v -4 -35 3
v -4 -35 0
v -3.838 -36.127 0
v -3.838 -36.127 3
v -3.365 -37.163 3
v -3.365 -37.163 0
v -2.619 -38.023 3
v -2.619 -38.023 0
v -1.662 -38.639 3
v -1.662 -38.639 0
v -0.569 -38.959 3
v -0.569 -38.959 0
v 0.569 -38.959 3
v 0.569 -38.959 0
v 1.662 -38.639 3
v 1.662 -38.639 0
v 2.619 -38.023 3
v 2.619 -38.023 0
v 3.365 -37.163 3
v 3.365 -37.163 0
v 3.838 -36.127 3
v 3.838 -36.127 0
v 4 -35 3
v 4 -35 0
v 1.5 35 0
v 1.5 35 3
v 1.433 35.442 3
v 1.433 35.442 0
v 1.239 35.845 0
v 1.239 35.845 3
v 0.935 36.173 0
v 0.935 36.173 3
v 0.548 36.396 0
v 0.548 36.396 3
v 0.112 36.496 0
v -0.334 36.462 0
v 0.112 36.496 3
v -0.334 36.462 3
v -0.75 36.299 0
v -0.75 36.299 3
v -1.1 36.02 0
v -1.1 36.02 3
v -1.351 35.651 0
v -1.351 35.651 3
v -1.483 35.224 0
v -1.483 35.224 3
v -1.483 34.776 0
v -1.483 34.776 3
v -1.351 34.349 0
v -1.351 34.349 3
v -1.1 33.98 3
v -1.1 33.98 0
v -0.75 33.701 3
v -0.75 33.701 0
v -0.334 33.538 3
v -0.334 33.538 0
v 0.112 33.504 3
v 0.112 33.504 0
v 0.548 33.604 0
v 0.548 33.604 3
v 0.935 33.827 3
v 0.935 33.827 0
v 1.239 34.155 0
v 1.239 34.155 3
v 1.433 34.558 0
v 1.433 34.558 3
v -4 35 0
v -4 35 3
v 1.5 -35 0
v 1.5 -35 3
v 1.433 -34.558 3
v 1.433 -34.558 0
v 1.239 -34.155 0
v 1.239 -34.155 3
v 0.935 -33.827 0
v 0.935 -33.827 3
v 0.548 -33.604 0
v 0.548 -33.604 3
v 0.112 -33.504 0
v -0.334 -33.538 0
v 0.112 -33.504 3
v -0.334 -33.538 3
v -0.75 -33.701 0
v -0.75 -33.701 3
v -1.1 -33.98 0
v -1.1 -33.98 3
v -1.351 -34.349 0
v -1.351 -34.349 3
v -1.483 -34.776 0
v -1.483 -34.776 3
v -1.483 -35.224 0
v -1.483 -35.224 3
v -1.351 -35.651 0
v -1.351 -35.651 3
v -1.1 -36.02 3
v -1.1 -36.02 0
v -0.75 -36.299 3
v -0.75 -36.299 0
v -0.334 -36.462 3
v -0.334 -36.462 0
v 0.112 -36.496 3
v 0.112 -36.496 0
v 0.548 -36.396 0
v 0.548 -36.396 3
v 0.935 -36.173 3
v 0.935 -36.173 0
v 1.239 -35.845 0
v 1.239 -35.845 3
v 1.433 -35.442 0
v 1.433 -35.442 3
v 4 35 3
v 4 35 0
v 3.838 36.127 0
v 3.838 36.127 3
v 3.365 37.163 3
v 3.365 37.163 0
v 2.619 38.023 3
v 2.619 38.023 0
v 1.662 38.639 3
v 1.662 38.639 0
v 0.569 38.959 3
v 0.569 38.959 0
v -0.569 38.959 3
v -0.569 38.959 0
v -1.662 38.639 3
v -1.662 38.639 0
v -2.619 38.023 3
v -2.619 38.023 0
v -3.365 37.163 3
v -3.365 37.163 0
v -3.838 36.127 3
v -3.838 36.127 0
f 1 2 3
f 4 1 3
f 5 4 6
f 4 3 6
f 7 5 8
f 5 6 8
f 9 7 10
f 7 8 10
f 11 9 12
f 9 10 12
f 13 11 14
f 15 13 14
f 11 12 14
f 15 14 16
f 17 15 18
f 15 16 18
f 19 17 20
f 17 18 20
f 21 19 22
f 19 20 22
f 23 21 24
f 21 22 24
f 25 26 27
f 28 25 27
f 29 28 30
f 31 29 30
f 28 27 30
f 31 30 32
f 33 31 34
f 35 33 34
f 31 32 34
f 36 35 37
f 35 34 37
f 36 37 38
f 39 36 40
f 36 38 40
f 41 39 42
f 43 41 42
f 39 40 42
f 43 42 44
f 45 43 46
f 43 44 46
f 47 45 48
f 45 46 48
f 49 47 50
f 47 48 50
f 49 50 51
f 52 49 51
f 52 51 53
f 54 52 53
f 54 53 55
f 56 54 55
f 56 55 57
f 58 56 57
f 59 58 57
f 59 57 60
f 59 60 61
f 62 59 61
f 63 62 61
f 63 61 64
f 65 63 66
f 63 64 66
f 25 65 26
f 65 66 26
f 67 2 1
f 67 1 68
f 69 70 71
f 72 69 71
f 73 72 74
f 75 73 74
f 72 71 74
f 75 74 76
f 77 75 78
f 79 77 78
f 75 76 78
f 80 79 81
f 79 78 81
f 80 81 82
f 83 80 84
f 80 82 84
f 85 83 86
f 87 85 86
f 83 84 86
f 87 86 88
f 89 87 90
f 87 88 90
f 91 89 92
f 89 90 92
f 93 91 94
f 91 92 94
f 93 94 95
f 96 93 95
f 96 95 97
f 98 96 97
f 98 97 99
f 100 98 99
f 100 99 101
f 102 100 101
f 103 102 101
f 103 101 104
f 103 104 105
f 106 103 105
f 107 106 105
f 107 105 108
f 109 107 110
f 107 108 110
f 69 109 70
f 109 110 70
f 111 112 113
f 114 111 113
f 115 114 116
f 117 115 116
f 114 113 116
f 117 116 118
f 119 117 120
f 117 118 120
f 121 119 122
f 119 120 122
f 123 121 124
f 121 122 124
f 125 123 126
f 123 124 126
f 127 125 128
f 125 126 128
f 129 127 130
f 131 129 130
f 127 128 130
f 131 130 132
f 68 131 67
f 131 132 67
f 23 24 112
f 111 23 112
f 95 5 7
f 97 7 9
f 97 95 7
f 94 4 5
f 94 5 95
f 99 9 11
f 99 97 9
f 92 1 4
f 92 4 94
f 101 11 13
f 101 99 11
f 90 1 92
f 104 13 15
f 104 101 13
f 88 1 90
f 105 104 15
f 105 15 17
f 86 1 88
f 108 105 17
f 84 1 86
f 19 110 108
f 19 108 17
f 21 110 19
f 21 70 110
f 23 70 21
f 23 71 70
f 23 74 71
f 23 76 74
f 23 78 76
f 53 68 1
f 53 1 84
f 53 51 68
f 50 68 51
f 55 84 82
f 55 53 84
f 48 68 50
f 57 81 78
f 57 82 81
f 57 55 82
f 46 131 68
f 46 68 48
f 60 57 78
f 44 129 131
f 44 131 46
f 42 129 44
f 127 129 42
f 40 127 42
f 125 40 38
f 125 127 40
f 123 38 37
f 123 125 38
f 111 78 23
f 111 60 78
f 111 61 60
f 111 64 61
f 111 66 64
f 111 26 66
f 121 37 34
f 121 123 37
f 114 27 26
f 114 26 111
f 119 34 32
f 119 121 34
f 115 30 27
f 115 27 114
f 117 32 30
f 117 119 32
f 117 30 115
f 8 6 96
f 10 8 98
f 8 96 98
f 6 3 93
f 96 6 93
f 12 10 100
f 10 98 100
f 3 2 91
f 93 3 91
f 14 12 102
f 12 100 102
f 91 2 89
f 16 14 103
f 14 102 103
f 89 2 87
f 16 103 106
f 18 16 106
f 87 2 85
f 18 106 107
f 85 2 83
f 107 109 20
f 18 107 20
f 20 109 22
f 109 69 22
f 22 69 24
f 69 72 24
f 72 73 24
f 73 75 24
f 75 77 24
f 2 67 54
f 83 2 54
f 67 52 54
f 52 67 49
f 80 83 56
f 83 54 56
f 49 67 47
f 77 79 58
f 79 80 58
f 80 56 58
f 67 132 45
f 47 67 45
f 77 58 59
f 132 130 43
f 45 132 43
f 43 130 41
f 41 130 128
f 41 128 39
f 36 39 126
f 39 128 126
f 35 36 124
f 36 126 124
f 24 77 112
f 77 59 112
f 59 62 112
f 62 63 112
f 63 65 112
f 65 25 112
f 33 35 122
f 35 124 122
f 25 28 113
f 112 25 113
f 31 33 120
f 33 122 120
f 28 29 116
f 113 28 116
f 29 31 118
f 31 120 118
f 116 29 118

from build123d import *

# Parameters (mm, degrees)
SKETCH_1_W          = 8
SKETCH_1_H          = 70
EXTRUDE_1_DEPTH     = 3
SKETCH_2_R          = 4
EXTRUDE_2_DEPTH     = 3
SKETCH_3_R          = 1.5
CUT_EXTRUDE_1_DEPTH = 3


with BuildPart() as part:
    # 草图1 → 凸台-拉伸1 (new body)
    with BuildSketch(Plane.XY):
        Rectangle(SKETCH_1_W, SKETCH_1_H)
    extrude(amount=EXTRUDE_1_DEPTH)

    # 草图2 → 凸台-拉伸2 (add)
    with BuildSketch(Plane.XY):
        with Locations((0, 35)):
            Circle(SKETCH_2_R)
        with Locations((0, -35)):
            Circle(SKETCH_2_R)
    extrude(amount=EXTRUDE_2_DEPTH)

    # 草图3 → 切除-拉伸1 (cut)
    with BuildSketch(Plane.XY.offset(3)):
        with Locations((0, 35)):
            Circle(SKETCH_3_R)
        with Locations((0, -35)):
            Circle(SKETCH_3_R)
    extrude(amount=-CUT_EXTRUDE_1_DEPTH, mode=Mode.SUBTRACT)


solid = part.part
